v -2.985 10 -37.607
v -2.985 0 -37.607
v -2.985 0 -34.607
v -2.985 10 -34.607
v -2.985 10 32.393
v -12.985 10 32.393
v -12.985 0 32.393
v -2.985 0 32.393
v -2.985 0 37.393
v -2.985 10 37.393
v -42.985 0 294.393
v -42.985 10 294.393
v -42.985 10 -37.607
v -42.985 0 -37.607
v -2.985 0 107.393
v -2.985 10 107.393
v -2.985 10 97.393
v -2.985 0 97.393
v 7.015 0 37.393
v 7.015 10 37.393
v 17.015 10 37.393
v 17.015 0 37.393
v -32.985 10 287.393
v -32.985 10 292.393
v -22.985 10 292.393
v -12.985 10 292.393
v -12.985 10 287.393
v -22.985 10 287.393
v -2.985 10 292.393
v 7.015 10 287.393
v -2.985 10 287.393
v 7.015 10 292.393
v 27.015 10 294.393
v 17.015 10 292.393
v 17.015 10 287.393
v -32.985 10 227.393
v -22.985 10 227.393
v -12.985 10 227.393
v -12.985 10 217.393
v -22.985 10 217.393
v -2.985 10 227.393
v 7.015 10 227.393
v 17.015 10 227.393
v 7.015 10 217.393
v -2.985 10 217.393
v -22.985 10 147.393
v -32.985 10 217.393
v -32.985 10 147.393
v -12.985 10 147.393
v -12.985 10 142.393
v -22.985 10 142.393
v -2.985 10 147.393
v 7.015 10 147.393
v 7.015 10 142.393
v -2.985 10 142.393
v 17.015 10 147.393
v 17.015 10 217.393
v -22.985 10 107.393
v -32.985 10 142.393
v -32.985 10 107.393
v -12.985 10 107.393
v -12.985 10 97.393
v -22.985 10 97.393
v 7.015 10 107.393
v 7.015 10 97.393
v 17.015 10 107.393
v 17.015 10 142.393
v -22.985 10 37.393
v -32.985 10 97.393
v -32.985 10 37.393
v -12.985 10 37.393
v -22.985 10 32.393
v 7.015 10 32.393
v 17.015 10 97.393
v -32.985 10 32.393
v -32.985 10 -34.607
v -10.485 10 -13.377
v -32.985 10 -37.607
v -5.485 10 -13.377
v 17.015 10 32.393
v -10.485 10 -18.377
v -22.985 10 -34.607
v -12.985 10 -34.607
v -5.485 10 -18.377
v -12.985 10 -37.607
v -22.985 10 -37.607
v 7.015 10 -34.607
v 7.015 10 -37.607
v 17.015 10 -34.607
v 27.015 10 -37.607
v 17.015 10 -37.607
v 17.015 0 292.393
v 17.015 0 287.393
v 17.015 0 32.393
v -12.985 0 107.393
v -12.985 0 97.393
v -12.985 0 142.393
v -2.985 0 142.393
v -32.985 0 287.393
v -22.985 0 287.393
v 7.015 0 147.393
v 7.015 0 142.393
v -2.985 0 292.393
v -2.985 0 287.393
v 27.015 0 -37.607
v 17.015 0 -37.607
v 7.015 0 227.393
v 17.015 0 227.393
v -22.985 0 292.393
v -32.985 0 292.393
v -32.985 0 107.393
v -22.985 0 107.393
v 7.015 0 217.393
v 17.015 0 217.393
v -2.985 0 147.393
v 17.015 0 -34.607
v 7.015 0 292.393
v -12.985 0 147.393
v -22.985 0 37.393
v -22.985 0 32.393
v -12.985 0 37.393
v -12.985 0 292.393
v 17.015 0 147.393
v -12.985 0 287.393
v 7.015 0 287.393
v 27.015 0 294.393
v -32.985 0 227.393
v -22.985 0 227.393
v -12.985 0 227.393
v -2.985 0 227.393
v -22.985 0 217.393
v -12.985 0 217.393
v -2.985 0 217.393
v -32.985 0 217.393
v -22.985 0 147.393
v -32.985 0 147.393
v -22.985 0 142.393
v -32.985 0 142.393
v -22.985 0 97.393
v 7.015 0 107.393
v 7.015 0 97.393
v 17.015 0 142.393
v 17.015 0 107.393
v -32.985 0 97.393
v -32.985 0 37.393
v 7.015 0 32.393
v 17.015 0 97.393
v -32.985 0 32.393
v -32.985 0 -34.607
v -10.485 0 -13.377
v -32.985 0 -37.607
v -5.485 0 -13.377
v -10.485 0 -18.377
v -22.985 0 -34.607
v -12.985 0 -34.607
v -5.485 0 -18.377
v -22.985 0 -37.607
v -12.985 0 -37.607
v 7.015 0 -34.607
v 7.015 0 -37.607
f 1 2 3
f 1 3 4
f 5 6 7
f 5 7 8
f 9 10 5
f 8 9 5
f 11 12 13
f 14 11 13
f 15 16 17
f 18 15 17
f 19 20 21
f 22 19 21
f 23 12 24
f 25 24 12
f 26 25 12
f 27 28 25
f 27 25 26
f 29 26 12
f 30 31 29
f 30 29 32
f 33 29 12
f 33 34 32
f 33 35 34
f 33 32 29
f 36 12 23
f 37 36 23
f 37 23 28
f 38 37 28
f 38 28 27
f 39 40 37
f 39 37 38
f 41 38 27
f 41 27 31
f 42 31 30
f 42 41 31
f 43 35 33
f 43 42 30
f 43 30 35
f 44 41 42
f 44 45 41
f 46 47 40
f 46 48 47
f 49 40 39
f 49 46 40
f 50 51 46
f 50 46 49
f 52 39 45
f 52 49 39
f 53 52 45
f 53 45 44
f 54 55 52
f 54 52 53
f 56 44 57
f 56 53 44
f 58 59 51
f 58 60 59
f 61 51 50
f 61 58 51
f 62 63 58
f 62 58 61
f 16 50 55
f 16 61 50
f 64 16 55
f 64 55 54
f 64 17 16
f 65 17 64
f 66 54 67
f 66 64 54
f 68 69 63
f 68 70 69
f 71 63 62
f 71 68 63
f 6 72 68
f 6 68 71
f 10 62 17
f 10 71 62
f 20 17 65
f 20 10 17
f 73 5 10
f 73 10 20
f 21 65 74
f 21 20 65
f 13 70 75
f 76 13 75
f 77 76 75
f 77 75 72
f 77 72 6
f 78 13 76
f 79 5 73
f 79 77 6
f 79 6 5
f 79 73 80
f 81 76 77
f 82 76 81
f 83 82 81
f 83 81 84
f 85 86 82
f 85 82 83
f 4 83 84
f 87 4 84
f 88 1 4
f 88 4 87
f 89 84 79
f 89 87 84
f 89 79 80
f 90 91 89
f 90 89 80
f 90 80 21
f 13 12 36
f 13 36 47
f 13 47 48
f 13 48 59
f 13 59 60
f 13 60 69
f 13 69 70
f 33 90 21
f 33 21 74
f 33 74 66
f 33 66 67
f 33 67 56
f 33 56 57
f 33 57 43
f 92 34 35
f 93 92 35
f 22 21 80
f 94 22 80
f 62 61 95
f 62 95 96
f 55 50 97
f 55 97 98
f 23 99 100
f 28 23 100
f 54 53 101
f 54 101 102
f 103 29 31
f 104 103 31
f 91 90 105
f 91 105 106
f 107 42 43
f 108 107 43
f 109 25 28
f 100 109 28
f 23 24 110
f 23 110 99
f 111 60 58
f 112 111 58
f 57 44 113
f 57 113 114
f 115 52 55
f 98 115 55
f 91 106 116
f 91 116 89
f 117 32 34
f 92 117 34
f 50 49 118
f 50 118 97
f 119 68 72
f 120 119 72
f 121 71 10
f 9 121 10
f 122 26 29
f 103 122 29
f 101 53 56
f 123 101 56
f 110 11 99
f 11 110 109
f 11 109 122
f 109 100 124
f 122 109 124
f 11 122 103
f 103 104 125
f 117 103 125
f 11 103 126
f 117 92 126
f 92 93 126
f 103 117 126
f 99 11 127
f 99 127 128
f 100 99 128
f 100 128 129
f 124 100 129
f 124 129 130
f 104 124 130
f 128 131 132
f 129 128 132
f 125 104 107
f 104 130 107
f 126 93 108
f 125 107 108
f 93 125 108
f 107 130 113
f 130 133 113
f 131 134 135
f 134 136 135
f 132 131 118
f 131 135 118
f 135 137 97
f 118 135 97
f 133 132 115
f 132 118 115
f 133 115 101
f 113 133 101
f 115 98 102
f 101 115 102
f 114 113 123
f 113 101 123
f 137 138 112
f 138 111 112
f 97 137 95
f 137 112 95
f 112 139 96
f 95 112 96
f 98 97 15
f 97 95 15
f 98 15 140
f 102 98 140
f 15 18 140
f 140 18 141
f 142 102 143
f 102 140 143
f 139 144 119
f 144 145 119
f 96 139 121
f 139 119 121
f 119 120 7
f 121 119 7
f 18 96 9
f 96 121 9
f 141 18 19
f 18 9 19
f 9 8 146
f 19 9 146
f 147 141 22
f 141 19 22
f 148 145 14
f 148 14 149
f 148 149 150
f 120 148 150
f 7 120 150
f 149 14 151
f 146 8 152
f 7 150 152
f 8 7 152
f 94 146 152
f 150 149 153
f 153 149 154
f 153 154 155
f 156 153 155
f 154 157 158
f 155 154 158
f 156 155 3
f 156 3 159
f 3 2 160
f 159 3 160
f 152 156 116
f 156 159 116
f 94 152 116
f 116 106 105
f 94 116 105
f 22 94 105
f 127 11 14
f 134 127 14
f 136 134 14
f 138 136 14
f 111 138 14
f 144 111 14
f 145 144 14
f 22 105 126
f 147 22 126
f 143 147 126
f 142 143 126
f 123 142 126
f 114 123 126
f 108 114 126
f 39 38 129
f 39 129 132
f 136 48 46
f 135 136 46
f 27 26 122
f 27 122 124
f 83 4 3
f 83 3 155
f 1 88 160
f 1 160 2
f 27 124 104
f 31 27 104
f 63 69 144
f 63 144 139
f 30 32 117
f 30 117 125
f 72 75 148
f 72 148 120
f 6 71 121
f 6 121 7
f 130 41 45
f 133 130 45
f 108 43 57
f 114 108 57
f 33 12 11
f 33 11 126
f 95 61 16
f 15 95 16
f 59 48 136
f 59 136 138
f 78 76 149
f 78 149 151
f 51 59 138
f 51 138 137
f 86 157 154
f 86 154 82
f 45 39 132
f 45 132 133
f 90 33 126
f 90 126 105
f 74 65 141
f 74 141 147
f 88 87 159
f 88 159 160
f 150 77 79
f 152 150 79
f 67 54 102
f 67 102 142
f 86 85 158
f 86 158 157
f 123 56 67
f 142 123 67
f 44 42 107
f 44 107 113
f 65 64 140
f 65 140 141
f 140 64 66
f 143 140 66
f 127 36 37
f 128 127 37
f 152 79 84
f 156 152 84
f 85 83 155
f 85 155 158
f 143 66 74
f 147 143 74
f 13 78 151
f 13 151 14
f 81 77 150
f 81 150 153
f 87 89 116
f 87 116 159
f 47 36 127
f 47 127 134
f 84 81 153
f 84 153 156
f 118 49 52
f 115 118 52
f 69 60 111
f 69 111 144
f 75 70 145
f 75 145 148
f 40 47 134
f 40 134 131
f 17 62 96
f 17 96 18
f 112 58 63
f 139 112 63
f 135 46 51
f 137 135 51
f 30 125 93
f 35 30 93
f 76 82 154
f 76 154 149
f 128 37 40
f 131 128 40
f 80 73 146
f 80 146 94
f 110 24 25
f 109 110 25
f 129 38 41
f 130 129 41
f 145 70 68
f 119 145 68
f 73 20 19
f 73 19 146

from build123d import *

# Parameters (mm, degrees)
ESQUISSE1_W                = 70
ESQUISSE1_H                = 332
BOSS_EXTRU_1_DEPTH         = 10
ESQUISSE2_W                = 10
ESQUISSE2_H                = 10
ESQUISSE2_H_2              = 5
ENL_V_MAT_EXTRU_1_DEPTH    = 10
R_P_TITION_LIN_AIRE1_COUNT = 3
R_P_TITION_LIN_AIRE1_PITCH = 20
ESQUISSE4_W                = 10
ESQUISSE4_H                = 5
ESQUISSE4_H_2              = 3
BOSS_EXTRU_2_DEPTH         = 10
R_P_TITION_LIN_AIRE2_COUNT = 4
R_P_TITION_LIN_AIRE2_PITCH = 20
ESQUISSE12_W               = 10
ESQUISSE12_H               = 5
ENL_V_MAT_EXTRU_7_DEPTH    = 10
R_P_TITION_LIN_AIRE5_COUNT = 3
R_P_TITION_LIN_AIRE5_PITCH = 20
ESQUISSE14_W               = 70
ESQUISSE14_H               = 2
BOSS_EXTRU_4_DEPTH         = 10
ESQUISSE17_W               = 10
ESQUISSE17_H               = 10
ENL_V_MAT_EXTRU_10_DEPTH   = 10
ESQUISSE18_W               = 10
ESQUISSE18_H               = 10
ENL_V_MAT_EXTRU_11_DEPTH   = 10
ESQUISSE19_W               = 5
ESQUISSE19_H               = 5
ENL_V_MAT_EXTRU_12_DEPTH   = 10


with BuildPart() as part:
    # Esquisse1 → Boss.-Extru.1 (new body)
    with BuildSketch(Plane(origin=(0, 0, 0), x_dir=(1, 0, 0), z_dir=(0, 1, 0))):
        with Locations((-7.984615385, -121.393323657)):
            Rectangle(ESQUISSE1_W, ESQUISSE1_H)
    extrude(amount=BOSS_EXTRU_1_DEPTH)

    # Esquisse2 → Enlèv. mat.-Extru.1 (cut)
    with BuildSketch(Plane(origin=(0, 10, 0), x_dir=(1, 0, 0), z_dir=(0, 1, 0))):
        with Locations((-27.984615385, -222.393323657)):
            Rectangle(ESQUISSE2_W, ESQUISSE2_H)
        with Locations((-27.984615385, -102.393323657)):
            Rectangle(ESQUISSE2_W, ESQUISSE2_H)
        with Locations((-27.984615385, -144.893323657)):
            Rectangle(ESQUISSE2_W, ESQUISSE2_H_2)
    enl_v_mat_extru_1 = extrude(amount=-ENL_V_MAT_EXTRU_1_DEPTH, mode=Mode.SUBTRACT)

    # Répétition linéaire1: Enlèv. mat.-Extru.1 ×3
    with Locations(*[(i * R_P_TITION_LIN_AIRE1_PITCH, 0, 0) for i in range(1, R_P_TITION_LIN_AIRE1_COUNT)]):
        add(enl_v_mat_extru_1, mode=Mode.SUBTRACT)

    # Esquisse4 → Boss.-Extru.2 (add)
    with BuildSketch(Plane(origin=(0, 10, 0), x_dir=(1, 0, 0), z_dir=(0, 1, 0))):
        with Locations((-37.984615385, -289.893323657)):
            Rectangle(ESQUISSE4_W, ESQUISSE4_H)
        with Locations((-37.984615385, 46.106676343)):
            Rectangle(ESQUISSE4_W, ESQUISSE4_H_2)
    boss_extru_2 = extrude(amount=-BOSS_EXTRU_2_DEPTH)

    # Répétition linéaire2: Boss.-Extru.2 ×4
    with Locations(*[(i * R_P_TITION_LIN_AIRE2_PITCH, 0, 0) for i in range(1, R_P_TITION_LIN_AIRE2_COUNT)]):
        add(boss_extru_2)

    # Esquisse12 → Enlèv. mat.-Extru.7 (cut)
    with BuildSketch(Plane(origin=(0, 10, 0), x_dir=(1, 0, 0), z_dir=(0, 1, 0))):
        with Locations((-27.984615385, -34.893323657)):
            Rectangle(ESQUISSE12_W, ESQUISSE12_H)
    enl_v_mat_extru_7 = extrude(amount=-ENL_V_MAT_EXTRU_7_DEPTH, mode=Mode.SUBTRACT)

    # Répétition linéaire5: Enlèv. mat.-Extru.7 ×3
    with Locations(*[(i * R_P_TITION_LIN_AIRE5_PITCH, 0, 0) for i in range(1, R_P_TITION_LIN_AIRE5_COUNT)]):
        add(enl_v_mat_extru_7, mode=Mode.SUBTRACT)

    # Esquisse14 → Boss.-Extru.4 (add)
    with BuildSketch(Plane(origin=(0, 10, 0), x_dir=(1, 0, 0), z_dir=(0, 1, 0))):
        with Locations((-7.984615385, -293.393323657)):
            Rectangle(ESQUISSE14_W, ESQUISSE14_H)
    extrude(amount=-BOSS_EXTRU_4_DEPTH)

    # Esquisse17 → Enlèv. mat.-Extru.10 (cut)
    with BuildSketch(Plane(origin=(0, 0, -44.606676343), x_dir=(-1, 0, 0), z_dir=(0, 0, -1))):
        with Locations((27.984615385, 5)):
            Rectangle(ESQUISSE17_W, ESQUISSE17_H)
        with Locations((7.984615385, 5)):
            Rectangle(ESQUISSE17_W, ESQUISSE17_H)
        with Locations((-12.015384615, 5)):
            Rectangle(ESQUISSE17_W, ESQUISSE17_H)
    extrude(amount=-ENL_V_MAT_EXTRU_10_DEPTH, mode=Mode.SUBTRACT)

    # Esquisse18 → Enlèv. mat.-Extru.11 (cut)
    with BuildSketch(Plane(origin=(0, 0, -47.606676343), x_dir=(-1, 0, 0), z_dir=(0, 0, -1))):
        with Locations((37.984615385, 5)):
            Rectangle(ESQUISSE18_W, ESQUISSE18_H)
        with Locations((17.984615385, 5)):
            Rectangle(ESQUISSE18_W, ESQUISSE18_H)
        with Locations((-2.015384615, 5)):
            Rectangle(ESQUISSE18_W, ESQUISSE18_H)
        with Locations((-22.015384615, 5)):
            Rectangle(ESQUISSE18_W, ESQUISSE18_H)
    extrude(amount=-ENL_V_MAT_EXTRU_11_DEPTH, mode=Mode.SUBTRACT)

    # Esquisse19 → Enlèv. mat.-Extru.12 (cut)
    with BuildSketch(Plane(origin=(0, 10, 0), x_dir=(1, 0, 0), z_dir=(0, 1, 0))):
        with Locations((-7.984615385, 15.876676343)):
            Rectangle(ESQUISSE19_W, ESQUISSE19_H)
    extrude(amount=-ENL_V_MAT_EXTRU_12_DEPTH, mode=Mode.SUBTRACT)


solid = part.part
